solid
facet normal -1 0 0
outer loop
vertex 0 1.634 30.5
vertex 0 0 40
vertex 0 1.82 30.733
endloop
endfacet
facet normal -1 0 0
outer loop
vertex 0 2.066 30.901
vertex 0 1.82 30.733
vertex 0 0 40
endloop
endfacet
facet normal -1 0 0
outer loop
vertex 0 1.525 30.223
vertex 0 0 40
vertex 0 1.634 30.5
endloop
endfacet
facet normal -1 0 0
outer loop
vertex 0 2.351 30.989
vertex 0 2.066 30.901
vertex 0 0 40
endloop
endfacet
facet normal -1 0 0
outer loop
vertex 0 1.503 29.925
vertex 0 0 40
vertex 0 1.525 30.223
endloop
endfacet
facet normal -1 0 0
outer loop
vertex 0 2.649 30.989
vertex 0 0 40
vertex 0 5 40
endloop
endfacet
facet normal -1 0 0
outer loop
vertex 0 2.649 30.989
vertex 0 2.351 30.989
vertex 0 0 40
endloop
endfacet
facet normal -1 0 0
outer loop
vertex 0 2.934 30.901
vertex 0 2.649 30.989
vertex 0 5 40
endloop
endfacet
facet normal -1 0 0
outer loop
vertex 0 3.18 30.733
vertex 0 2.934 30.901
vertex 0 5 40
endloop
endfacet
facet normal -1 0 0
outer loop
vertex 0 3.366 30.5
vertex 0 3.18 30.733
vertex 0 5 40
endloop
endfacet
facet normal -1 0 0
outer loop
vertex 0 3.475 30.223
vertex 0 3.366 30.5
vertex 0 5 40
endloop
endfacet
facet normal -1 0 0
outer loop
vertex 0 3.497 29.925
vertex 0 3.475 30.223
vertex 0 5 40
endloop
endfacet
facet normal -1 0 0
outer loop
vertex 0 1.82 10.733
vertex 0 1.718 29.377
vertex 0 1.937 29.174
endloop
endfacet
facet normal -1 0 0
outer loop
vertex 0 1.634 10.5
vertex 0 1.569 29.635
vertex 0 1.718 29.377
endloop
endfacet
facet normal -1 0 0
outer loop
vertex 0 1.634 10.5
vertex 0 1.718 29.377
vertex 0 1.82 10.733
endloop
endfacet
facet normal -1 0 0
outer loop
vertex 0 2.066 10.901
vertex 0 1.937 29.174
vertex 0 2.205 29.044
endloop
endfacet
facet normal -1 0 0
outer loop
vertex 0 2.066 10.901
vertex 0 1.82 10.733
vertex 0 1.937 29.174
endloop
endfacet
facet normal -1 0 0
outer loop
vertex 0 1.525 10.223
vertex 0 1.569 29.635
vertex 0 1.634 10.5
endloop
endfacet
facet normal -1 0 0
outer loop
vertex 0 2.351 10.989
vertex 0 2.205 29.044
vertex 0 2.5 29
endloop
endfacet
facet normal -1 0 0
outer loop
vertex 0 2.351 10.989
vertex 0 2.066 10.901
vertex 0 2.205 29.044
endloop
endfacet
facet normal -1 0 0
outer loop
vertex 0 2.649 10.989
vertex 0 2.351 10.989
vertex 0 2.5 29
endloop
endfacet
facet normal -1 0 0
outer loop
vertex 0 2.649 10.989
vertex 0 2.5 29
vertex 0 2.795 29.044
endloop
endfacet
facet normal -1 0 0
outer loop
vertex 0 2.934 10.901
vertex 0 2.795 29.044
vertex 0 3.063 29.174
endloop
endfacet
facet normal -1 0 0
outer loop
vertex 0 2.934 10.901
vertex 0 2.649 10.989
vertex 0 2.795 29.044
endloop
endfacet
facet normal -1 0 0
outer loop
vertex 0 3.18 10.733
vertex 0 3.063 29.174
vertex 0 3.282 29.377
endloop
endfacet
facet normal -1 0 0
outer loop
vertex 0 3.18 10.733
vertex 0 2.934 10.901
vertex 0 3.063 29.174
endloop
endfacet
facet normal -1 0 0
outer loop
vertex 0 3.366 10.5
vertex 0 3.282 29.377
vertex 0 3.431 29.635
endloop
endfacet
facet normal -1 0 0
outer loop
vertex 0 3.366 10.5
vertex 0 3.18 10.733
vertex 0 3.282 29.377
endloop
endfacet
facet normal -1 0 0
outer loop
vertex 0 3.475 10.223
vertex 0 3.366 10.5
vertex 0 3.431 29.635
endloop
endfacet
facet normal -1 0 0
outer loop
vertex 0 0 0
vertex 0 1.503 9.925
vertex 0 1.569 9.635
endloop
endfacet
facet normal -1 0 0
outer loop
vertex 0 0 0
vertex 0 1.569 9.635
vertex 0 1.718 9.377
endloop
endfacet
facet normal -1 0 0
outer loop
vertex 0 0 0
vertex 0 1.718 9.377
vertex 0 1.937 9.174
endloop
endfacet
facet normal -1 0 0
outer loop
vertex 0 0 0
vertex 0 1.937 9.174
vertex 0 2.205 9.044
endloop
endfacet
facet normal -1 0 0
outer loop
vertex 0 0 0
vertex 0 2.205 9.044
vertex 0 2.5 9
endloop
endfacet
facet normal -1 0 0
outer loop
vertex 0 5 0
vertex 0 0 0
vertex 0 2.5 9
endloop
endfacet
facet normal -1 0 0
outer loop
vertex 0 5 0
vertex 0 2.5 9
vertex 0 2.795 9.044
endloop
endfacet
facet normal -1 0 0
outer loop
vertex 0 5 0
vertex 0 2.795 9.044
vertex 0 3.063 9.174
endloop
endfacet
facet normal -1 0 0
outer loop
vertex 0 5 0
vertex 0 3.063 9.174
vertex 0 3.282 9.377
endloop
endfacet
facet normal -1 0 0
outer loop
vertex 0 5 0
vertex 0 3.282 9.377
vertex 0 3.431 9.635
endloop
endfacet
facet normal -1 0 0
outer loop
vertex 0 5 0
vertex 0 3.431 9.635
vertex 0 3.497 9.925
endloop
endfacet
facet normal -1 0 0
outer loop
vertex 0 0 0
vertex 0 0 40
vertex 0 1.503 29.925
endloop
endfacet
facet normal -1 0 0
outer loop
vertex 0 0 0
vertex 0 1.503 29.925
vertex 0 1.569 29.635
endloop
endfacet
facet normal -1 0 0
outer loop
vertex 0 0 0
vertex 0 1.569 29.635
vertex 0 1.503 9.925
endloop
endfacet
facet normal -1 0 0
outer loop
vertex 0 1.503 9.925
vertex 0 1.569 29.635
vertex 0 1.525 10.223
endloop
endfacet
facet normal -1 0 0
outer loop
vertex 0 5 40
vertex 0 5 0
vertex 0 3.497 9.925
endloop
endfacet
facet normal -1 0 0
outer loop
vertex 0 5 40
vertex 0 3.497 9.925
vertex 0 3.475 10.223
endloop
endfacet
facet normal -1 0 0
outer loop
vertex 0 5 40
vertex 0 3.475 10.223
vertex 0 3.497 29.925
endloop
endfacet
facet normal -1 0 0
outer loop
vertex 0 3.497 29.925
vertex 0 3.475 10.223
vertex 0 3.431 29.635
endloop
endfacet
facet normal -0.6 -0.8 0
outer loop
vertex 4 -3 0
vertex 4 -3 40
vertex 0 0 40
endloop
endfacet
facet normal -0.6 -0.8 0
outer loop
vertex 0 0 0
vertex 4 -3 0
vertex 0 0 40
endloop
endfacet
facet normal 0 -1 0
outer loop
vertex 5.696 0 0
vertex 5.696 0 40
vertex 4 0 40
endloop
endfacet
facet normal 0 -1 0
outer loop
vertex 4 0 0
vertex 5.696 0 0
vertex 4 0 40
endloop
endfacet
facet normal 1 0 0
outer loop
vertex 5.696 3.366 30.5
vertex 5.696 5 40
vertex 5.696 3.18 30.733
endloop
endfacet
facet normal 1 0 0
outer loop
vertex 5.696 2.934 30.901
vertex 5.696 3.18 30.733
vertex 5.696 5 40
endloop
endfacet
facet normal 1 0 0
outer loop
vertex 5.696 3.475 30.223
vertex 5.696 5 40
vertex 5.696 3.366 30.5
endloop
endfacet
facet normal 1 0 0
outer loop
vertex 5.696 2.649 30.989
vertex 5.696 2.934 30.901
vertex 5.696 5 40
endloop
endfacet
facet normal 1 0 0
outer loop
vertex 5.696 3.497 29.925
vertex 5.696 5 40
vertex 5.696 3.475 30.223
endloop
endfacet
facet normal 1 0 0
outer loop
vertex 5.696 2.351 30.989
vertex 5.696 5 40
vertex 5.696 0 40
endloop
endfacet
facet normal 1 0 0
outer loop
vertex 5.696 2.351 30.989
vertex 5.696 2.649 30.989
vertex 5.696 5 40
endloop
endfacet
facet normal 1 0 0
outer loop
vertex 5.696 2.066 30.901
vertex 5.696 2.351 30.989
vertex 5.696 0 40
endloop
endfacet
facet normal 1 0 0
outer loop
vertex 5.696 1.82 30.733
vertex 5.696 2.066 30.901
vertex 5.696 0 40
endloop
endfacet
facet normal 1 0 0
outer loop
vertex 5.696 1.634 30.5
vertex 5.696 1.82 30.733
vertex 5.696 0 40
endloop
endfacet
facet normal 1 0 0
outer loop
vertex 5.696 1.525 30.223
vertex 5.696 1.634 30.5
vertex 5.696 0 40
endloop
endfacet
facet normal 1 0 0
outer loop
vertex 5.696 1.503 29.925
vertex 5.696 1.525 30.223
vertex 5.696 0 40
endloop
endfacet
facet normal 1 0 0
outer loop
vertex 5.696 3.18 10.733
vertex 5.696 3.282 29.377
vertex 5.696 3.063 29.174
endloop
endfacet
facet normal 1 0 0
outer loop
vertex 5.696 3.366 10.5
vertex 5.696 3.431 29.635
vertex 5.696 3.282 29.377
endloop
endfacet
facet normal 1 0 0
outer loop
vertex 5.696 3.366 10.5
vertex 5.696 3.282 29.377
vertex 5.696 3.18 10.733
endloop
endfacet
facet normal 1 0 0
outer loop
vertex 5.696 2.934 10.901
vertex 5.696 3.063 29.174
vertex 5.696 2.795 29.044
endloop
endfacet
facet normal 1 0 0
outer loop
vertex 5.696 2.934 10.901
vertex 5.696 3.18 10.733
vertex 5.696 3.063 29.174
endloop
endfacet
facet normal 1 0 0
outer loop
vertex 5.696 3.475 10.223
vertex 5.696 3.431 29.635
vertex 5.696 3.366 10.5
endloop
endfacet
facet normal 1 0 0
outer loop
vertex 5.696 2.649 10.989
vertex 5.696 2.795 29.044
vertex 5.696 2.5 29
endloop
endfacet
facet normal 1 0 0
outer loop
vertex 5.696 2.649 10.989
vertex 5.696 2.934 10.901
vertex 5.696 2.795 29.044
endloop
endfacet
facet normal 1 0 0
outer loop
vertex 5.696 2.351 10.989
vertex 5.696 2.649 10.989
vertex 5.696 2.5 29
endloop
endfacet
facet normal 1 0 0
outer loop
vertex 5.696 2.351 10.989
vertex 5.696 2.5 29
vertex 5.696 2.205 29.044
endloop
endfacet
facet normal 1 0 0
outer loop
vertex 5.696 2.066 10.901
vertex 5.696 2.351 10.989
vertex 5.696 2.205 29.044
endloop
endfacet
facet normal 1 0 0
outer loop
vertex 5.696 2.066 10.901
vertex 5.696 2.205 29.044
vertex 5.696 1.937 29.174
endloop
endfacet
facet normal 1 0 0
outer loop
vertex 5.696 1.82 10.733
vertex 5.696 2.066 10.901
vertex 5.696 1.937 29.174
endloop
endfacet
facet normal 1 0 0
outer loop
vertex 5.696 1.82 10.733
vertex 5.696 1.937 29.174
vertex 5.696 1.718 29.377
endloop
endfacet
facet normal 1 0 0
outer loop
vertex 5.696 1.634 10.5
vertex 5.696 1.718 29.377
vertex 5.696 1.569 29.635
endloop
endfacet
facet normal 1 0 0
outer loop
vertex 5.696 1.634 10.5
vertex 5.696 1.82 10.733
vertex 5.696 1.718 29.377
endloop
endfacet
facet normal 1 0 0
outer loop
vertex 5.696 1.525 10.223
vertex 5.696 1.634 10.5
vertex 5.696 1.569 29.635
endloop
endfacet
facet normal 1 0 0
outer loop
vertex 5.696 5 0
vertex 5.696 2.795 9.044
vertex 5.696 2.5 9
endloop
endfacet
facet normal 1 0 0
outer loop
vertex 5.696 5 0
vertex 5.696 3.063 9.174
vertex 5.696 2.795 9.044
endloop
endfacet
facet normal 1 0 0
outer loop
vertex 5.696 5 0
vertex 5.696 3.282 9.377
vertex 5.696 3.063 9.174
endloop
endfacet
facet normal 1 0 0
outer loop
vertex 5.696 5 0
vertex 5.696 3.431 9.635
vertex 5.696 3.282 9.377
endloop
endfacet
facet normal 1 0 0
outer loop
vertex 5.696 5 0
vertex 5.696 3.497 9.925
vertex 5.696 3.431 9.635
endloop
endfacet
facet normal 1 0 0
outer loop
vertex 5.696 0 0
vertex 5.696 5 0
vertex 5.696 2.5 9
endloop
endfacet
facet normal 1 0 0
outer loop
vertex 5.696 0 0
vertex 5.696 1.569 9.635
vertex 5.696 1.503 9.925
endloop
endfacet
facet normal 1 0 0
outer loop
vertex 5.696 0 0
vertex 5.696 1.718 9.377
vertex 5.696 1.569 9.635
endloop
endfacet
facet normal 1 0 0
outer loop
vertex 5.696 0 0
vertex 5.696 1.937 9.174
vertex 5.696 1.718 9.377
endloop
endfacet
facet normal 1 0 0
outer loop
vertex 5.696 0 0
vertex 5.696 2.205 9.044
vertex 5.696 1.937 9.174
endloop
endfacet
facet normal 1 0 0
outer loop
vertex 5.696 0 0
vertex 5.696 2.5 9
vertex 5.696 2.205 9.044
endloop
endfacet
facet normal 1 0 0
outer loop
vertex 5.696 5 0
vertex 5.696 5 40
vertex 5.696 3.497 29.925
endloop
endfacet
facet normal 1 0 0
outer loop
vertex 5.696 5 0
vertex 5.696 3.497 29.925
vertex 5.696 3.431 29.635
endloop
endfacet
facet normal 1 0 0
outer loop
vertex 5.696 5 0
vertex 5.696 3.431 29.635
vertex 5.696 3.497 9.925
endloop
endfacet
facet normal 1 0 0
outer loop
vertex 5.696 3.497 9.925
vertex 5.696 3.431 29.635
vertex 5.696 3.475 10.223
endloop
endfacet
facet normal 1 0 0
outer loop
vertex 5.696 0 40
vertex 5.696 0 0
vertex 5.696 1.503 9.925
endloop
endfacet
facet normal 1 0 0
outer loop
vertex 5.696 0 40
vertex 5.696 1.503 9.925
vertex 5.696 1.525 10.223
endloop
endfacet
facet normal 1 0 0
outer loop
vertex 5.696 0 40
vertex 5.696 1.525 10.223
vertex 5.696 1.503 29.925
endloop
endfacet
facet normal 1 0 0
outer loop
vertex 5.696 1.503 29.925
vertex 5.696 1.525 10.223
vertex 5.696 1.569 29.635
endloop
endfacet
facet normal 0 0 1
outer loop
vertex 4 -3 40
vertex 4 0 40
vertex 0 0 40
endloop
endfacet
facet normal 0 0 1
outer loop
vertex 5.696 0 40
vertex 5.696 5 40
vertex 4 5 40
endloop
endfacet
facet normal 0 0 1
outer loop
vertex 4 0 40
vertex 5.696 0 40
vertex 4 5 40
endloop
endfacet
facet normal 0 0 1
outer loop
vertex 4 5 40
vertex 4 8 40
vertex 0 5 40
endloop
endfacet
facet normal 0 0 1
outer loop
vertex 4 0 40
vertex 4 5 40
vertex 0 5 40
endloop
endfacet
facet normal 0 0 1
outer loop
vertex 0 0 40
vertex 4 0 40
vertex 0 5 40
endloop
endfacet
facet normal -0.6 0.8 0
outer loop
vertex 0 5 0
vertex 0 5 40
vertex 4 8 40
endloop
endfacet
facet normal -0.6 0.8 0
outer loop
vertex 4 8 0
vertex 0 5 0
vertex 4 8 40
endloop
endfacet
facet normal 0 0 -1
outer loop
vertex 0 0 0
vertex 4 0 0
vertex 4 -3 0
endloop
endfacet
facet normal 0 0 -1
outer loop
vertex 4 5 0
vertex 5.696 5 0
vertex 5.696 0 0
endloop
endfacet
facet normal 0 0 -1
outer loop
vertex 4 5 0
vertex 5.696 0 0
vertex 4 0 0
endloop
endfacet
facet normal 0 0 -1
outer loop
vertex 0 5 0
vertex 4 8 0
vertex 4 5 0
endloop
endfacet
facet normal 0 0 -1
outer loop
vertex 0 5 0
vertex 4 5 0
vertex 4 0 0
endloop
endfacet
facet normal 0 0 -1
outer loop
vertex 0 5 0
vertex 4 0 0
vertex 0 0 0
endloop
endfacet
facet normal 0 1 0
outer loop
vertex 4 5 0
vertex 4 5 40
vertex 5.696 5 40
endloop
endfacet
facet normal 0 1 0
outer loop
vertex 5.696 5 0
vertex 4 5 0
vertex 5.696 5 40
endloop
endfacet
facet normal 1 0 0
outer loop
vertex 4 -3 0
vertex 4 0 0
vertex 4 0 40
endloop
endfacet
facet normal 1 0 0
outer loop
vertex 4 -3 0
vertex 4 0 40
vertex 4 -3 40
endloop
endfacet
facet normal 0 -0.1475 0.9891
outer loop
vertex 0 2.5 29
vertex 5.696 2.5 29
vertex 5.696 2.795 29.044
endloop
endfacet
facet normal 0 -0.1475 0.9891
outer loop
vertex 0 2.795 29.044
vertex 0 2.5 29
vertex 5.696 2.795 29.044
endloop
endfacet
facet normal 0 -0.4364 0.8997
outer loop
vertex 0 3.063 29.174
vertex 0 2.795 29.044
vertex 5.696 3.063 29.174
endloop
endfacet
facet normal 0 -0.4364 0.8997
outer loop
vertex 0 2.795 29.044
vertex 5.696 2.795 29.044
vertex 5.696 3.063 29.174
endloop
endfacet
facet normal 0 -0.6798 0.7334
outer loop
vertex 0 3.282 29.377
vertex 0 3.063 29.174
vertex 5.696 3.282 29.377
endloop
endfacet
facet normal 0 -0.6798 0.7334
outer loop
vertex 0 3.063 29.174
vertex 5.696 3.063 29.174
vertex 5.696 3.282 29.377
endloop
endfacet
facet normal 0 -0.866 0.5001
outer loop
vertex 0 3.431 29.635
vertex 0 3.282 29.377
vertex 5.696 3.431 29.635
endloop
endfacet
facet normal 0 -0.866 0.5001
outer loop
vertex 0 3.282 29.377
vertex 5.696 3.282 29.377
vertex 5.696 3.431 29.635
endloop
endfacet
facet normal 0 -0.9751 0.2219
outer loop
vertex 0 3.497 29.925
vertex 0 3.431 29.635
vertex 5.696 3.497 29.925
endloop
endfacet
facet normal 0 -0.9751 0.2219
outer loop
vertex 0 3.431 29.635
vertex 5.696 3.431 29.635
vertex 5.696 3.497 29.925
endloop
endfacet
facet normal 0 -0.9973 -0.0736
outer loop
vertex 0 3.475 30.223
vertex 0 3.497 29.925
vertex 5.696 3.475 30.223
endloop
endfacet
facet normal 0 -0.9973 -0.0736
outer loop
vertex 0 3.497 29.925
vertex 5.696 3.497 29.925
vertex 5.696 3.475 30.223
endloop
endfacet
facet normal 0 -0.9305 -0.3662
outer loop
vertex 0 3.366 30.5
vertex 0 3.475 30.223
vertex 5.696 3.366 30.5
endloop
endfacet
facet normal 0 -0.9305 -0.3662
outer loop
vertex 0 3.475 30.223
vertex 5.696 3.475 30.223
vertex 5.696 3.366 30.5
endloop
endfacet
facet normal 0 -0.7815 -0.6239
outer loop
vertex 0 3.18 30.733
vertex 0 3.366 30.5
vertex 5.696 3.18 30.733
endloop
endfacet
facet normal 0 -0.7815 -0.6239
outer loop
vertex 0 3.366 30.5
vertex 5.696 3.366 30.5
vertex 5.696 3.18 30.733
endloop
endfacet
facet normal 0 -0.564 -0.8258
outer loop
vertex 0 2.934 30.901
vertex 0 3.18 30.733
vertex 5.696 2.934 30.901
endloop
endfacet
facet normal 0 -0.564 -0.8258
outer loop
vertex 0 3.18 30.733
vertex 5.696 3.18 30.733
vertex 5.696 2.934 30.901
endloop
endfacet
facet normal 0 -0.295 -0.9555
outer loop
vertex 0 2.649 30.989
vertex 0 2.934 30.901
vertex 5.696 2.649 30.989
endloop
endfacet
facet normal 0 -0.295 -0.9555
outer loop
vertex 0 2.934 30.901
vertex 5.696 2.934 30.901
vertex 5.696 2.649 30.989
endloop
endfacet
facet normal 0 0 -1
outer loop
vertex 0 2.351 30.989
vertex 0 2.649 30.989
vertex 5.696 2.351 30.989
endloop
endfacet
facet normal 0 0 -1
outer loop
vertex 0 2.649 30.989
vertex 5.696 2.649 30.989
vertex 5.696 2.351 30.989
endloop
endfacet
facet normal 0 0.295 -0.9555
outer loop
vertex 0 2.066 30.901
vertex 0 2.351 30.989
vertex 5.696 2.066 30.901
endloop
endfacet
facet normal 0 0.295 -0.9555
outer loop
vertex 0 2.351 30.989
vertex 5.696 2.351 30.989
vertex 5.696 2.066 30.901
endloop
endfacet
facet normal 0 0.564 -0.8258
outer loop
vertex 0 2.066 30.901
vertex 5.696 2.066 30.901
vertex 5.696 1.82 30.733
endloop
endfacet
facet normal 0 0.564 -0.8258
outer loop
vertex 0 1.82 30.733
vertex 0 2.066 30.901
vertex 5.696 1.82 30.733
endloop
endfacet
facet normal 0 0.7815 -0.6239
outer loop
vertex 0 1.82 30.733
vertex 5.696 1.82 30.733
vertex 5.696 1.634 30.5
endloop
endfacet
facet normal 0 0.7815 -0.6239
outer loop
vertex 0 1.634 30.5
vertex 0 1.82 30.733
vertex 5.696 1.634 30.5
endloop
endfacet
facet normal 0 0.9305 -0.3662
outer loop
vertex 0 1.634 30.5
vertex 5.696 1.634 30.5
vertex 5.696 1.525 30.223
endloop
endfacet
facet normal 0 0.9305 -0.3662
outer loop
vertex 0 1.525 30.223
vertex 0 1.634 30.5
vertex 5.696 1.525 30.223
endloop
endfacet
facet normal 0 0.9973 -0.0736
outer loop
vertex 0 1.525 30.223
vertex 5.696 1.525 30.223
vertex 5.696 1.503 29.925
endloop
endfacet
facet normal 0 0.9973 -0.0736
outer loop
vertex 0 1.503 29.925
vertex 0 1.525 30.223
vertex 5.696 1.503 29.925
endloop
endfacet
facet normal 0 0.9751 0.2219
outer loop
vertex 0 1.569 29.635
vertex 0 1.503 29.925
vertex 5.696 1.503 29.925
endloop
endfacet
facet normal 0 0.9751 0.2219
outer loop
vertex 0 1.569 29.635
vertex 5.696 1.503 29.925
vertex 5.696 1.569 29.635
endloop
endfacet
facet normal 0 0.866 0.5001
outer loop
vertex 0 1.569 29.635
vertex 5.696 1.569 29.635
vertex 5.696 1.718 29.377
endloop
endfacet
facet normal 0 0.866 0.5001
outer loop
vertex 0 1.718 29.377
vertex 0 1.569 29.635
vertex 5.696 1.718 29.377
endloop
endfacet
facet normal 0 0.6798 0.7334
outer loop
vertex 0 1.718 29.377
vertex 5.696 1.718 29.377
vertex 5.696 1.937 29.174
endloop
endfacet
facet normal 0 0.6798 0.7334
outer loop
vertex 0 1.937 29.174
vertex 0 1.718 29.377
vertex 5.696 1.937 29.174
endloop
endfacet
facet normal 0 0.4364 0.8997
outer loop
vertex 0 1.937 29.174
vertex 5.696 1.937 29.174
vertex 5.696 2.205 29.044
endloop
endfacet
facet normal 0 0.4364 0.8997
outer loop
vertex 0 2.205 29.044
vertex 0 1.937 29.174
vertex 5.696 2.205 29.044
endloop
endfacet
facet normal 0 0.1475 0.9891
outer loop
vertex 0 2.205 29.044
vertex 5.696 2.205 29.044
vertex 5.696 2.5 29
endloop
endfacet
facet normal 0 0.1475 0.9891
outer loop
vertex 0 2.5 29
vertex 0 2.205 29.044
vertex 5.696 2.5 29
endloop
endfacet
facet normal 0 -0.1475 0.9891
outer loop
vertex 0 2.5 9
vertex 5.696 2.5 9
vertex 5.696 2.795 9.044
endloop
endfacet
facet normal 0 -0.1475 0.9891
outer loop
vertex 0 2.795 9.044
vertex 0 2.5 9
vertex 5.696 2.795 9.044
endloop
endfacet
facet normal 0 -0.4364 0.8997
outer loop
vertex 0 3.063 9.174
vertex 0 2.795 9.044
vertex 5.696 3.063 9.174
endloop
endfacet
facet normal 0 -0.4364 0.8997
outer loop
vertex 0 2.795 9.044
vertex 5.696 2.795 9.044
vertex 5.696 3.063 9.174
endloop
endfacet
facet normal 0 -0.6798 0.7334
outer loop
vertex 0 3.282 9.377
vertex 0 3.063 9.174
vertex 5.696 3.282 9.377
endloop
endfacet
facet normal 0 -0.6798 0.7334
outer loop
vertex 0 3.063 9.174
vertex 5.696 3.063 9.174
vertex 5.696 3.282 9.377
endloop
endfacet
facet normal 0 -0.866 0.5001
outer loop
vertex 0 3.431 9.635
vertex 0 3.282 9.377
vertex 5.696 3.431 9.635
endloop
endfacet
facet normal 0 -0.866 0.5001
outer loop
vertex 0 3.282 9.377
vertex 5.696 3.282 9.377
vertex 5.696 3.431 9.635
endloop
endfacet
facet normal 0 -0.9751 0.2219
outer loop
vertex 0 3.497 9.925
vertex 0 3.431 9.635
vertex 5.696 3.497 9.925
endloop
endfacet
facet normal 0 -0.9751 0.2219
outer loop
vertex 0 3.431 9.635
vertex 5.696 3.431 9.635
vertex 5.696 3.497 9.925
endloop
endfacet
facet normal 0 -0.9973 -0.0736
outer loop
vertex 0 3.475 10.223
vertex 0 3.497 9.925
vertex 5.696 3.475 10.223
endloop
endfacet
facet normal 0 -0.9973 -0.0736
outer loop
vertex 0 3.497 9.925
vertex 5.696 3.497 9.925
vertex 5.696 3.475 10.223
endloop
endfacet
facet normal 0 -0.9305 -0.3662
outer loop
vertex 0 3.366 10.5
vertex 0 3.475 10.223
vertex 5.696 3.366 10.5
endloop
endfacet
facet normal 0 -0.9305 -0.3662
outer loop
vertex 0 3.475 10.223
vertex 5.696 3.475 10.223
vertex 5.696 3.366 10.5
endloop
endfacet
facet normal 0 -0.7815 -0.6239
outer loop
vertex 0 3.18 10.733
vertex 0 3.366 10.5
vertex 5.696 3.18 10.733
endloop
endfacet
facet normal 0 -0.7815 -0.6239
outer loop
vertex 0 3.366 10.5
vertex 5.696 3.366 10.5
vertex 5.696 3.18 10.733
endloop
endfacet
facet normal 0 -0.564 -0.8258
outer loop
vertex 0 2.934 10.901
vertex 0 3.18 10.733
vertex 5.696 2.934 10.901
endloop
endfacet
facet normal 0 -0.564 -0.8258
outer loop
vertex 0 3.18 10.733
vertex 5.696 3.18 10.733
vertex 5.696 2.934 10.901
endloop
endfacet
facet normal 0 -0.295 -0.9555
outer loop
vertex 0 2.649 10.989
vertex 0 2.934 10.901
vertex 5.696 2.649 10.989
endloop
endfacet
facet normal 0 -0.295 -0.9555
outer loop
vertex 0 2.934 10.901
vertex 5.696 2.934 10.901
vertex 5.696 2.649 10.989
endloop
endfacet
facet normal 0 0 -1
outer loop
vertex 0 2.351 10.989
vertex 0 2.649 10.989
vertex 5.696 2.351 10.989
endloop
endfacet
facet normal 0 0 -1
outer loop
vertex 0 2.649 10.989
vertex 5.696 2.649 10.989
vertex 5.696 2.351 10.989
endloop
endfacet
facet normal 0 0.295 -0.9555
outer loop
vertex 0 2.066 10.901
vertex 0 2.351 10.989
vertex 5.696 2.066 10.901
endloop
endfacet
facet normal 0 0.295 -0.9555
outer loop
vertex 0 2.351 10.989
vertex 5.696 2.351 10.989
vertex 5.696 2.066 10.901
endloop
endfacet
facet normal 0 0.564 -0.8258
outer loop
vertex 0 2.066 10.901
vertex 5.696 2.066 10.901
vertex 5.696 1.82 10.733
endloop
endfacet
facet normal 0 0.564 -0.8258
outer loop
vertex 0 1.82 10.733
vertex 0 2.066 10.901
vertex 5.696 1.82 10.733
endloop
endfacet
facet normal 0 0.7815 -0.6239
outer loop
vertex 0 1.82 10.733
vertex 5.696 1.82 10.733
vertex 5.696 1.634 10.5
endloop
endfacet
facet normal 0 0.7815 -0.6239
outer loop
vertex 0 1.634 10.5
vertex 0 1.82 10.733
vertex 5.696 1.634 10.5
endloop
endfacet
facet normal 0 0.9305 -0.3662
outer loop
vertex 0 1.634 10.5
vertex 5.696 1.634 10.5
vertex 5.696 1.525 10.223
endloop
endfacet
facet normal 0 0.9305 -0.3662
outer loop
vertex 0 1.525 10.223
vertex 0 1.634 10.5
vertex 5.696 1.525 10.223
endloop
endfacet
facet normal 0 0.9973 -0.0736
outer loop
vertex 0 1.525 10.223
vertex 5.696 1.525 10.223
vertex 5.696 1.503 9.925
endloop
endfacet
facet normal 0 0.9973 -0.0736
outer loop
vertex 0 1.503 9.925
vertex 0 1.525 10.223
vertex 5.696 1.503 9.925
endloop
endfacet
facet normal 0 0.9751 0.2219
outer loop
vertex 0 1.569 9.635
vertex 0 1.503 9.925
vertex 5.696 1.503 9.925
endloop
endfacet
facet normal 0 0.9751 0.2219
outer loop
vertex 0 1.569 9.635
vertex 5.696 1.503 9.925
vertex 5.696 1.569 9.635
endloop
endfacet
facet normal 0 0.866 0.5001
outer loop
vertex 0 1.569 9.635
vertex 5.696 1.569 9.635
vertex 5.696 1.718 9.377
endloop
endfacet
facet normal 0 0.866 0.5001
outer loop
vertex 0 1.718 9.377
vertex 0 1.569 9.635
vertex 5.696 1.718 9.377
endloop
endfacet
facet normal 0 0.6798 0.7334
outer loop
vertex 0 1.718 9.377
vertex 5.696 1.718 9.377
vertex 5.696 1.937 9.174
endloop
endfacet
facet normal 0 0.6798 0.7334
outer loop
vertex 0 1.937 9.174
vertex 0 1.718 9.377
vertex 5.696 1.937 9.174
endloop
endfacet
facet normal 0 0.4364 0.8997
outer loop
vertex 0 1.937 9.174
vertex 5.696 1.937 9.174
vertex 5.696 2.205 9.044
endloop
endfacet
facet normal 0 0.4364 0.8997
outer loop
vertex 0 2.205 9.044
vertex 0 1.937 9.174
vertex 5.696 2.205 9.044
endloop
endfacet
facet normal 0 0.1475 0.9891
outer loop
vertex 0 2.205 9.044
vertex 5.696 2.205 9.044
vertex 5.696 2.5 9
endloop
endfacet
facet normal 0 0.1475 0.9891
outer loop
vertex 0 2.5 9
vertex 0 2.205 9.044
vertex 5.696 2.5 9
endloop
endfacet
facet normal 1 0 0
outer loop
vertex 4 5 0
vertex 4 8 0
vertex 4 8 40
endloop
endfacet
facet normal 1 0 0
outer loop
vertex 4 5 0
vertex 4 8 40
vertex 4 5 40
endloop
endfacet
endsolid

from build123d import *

# Parameters (mm, degrees)
BOSS_EXTRU_1_DEPTH         = 40
ESQUISSE1_R                = 1
ENL_V_MAT_EXTRU_1_DEPTH    = 6.695841166
R_P_TITION_LIN_AIRE2_COUNT = 2
R_P_TITION_LIN_AIRE2_PITCH = 20


with BuildPart() as part:
    # ProfileRainureEsquisse → Boss.-Extru.1 (new body)
    with BuildSketch(Plane.XY):
        Polygon((0, 0), (0, 5), (4, 8), (4, 5), (5.695841166, 5), (5.695841166, 0), (4, 0), (4, -3), align=None)
    extrude(amount=BOSS_EXTRU_1_DEPTH)

    # Esquisse1 → Enlèv. mat.-Extru.1 (cut, through all)
    with BuildSketch(Plane(origin=(5.695841166, 0, 0), x_dir=(0, 0, -1), z_dir=(1, 0, 0))):
        with Locations((-30, 2.5)):
            Circle(ESQUISSE1_R)
    enl_v_mat_extru_1 = extrude(amount=-ENL_V_MAT_EXTRU_1_DEPTH, mode=Mode.SUBTRACT)

    # Répétition linéaire2: Enlèv. mat.-Extru.1 ×2
    with Locations(*[(0, 0, -i * R_P_TITION_LIN_AIRE2_PITCH) for i in range(1, R_P_TITION_LIN_AIRE2_COUNT)]):
        add(enl_v_mat_extru_1, mode=Mode.SUBTRACT)


solid = part.part
